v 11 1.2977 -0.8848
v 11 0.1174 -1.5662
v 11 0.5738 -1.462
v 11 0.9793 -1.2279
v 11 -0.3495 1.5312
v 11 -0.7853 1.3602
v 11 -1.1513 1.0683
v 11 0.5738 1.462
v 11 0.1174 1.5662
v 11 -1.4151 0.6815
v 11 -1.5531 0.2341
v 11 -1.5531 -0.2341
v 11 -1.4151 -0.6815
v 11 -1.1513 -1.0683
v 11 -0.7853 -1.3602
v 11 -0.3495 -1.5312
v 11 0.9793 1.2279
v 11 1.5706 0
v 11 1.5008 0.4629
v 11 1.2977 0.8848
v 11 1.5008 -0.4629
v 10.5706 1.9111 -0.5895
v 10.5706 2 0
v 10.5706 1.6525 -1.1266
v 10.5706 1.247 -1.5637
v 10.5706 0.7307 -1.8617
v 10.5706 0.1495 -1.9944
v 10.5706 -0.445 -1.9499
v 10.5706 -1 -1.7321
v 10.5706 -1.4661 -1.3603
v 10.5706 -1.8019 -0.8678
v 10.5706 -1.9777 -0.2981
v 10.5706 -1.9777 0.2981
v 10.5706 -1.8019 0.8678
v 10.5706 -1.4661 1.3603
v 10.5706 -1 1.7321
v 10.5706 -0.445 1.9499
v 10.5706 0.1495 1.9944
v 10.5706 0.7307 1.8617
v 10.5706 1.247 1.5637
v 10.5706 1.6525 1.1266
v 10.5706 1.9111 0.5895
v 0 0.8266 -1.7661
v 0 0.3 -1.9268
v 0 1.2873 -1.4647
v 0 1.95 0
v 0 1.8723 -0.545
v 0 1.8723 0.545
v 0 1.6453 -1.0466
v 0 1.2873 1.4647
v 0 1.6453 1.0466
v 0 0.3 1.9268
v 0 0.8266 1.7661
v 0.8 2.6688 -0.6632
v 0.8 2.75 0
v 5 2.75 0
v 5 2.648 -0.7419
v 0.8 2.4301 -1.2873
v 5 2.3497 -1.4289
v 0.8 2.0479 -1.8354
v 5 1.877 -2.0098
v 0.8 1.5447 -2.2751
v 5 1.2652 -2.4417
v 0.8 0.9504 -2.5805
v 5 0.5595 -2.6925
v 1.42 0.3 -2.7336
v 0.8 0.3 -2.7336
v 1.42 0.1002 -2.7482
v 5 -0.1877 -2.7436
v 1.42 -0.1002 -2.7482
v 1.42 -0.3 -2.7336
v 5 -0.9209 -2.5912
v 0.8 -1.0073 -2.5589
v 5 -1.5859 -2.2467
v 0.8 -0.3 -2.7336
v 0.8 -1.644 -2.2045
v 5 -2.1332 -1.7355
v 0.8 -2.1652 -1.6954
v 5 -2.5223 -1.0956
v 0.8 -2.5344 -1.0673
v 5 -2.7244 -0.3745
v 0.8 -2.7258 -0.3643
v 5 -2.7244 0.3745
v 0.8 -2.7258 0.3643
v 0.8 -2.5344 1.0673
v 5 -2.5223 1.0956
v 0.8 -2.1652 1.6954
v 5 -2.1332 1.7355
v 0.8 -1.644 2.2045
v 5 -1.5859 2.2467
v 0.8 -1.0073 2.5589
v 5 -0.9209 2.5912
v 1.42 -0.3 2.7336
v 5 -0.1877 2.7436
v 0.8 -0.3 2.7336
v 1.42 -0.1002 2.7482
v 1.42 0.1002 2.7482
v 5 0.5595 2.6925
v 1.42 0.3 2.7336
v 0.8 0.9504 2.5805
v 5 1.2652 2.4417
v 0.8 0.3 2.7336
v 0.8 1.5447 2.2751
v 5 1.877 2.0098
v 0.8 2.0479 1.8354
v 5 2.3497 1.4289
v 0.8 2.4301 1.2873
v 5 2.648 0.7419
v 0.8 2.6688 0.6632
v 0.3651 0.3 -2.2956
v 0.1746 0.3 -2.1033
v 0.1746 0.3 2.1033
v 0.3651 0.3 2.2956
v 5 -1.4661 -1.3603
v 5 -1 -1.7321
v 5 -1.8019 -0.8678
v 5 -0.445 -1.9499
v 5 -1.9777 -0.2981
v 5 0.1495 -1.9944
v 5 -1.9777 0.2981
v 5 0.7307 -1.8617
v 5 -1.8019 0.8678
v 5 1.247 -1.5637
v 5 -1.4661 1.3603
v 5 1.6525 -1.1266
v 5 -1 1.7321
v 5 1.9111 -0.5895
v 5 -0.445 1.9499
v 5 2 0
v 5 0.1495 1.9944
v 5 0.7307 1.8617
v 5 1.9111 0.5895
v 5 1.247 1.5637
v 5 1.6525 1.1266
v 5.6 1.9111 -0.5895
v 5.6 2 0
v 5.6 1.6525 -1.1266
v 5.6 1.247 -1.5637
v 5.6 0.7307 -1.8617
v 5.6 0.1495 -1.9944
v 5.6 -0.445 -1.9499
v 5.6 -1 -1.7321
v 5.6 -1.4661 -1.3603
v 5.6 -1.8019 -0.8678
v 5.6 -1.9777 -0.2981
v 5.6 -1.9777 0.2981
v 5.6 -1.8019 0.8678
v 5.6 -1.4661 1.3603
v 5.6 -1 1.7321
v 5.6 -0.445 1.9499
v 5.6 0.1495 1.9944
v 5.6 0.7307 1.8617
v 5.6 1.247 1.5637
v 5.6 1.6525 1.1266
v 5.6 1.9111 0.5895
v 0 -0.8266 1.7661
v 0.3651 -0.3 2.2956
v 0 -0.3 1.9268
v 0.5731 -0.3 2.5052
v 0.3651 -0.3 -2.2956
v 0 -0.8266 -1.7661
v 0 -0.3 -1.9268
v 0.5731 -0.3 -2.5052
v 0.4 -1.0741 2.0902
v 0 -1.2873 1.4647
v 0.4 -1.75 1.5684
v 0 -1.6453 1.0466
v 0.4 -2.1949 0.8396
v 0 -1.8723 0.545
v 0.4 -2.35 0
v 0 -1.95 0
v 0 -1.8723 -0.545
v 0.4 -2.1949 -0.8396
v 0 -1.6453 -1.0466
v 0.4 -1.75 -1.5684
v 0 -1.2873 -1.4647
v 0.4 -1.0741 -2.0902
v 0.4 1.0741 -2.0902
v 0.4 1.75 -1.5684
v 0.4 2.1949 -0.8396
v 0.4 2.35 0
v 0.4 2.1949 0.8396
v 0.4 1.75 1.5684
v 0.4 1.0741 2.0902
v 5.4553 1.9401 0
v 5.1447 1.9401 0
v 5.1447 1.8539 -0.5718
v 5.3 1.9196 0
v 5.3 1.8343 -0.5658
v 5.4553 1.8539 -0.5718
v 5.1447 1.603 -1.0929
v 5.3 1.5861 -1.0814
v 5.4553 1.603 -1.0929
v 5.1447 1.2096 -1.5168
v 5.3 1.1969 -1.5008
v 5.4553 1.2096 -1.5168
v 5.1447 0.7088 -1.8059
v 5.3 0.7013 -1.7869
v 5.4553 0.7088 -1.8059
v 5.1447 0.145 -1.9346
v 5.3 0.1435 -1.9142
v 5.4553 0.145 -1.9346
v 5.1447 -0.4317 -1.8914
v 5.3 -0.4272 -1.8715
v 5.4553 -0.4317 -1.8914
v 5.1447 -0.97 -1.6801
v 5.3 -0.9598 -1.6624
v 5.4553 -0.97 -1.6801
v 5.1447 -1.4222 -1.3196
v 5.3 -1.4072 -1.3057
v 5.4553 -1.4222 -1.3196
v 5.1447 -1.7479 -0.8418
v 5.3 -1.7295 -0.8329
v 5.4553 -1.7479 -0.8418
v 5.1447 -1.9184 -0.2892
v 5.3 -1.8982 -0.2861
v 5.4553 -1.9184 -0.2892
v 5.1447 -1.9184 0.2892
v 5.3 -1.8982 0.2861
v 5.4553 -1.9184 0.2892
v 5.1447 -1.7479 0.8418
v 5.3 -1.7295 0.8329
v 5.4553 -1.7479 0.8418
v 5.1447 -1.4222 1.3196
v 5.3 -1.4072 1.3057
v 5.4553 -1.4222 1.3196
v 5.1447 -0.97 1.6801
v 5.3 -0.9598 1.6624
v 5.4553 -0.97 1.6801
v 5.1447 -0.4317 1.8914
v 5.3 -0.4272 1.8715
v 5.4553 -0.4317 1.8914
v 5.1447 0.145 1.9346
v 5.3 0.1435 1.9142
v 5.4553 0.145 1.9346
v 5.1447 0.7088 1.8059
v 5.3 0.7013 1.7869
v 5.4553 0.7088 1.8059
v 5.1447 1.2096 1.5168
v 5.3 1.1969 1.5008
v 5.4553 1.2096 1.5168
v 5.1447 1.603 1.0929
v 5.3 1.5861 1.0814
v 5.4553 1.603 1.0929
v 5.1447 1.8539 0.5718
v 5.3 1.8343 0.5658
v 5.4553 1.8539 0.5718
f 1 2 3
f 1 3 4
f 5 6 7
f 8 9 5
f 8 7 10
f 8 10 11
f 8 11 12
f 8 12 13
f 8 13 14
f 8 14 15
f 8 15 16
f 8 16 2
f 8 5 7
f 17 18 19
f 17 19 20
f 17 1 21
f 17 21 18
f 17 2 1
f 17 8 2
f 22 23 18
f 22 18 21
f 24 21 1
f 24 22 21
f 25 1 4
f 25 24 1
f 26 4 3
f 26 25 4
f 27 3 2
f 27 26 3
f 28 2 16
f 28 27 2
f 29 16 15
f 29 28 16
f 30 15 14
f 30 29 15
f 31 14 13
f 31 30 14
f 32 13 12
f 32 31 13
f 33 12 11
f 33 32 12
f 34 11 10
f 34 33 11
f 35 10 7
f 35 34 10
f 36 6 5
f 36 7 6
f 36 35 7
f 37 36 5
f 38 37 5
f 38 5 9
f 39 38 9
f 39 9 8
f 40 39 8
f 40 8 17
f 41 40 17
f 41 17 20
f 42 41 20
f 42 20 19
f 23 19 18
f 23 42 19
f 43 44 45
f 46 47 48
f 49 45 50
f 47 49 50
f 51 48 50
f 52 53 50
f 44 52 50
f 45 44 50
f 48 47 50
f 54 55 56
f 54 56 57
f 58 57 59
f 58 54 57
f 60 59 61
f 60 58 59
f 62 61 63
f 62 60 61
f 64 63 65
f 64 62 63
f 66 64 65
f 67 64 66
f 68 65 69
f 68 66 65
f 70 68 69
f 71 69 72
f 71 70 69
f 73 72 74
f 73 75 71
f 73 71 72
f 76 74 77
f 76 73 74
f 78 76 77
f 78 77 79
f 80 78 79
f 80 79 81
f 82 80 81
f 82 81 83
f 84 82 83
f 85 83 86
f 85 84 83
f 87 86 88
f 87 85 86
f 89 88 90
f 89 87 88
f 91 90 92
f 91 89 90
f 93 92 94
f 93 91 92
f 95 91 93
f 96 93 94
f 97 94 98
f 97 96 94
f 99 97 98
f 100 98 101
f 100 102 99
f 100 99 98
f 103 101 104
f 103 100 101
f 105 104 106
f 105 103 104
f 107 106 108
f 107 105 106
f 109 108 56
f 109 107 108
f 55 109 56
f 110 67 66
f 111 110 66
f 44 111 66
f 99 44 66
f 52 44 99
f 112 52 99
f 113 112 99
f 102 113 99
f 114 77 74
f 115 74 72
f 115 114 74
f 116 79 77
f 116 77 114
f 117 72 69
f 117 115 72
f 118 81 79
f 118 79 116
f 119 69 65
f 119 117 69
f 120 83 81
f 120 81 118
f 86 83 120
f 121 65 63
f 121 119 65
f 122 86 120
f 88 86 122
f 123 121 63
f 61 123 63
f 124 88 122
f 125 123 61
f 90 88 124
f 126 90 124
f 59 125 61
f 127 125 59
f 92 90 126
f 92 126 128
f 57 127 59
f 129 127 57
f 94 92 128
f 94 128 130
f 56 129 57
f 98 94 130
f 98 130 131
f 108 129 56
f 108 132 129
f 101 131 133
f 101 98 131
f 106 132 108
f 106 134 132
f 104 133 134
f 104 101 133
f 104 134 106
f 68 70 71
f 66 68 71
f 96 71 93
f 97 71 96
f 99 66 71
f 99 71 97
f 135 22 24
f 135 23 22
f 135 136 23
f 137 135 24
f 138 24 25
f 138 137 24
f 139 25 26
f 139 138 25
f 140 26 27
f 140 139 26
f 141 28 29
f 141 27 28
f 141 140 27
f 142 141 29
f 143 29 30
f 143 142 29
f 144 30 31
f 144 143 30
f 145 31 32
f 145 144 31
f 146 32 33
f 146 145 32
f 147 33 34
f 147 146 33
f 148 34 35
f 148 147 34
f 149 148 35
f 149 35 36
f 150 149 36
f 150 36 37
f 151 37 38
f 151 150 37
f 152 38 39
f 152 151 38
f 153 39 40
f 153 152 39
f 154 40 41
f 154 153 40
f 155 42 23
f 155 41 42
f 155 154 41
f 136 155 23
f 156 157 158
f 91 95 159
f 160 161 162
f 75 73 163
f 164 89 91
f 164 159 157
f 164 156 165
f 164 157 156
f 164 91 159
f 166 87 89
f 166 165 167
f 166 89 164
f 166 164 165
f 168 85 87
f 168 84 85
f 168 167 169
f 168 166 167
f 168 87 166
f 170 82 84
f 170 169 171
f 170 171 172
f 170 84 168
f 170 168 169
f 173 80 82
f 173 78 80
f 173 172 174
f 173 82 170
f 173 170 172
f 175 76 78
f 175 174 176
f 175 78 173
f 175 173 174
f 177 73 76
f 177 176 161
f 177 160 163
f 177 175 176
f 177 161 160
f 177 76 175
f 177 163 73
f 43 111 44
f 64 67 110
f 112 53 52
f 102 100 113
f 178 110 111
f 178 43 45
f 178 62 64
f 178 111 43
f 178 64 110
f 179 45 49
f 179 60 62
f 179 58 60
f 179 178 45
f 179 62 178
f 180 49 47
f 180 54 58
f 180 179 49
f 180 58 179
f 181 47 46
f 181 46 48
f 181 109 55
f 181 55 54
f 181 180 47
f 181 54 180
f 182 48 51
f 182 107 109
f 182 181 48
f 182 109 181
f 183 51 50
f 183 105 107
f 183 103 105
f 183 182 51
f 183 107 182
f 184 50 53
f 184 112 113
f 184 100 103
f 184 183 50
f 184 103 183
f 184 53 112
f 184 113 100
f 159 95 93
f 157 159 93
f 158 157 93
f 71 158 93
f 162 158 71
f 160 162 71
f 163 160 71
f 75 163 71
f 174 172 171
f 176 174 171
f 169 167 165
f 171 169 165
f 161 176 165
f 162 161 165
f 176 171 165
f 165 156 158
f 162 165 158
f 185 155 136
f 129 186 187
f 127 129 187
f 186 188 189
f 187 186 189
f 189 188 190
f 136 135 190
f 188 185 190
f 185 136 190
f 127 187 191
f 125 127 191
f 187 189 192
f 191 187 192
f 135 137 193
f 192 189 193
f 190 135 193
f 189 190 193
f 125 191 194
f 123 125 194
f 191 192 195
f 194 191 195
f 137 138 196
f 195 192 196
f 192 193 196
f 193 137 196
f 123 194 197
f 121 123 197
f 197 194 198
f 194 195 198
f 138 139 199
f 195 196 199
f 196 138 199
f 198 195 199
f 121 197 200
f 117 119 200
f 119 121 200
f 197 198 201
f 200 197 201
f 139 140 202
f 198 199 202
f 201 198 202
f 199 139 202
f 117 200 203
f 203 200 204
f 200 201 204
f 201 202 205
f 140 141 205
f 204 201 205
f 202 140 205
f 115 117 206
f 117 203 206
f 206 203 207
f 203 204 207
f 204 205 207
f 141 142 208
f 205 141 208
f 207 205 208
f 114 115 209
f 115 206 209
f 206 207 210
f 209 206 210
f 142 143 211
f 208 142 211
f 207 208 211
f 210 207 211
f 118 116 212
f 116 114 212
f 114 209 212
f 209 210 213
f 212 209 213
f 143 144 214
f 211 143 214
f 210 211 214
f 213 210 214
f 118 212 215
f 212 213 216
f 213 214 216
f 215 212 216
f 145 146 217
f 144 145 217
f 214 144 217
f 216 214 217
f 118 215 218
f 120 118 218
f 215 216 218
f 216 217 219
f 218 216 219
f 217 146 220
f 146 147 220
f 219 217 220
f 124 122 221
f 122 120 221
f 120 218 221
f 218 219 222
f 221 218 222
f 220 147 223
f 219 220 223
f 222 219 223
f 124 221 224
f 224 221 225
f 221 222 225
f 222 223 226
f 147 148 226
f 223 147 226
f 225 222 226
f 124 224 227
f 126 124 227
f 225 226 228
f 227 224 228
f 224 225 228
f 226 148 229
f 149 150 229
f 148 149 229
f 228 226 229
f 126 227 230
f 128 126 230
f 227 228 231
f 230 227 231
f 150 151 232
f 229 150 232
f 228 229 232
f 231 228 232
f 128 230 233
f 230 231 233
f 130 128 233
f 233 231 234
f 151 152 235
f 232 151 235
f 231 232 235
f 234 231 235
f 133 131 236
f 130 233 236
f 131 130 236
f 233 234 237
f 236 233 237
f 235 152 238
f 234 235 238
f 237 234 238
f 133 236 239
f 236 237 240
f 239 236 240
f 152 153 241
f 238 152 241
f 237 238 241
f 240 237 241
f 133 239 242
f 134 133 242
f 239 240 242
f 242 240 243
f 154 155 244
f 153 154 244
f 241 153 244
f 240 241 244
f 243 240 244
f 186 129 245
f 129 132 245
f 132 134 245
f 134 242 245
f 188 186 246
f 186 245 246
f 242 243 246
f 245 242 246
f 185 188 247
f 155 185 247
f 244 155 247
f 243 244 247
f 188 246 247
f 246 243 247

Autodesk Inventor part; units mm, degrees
ref_plane "YZ Plane" through (0, 0, 0) normal (1, 0, 0) x (0, 1, 0)
ref_plane "XZ Plane" through (0, 0, 0) normal (0, 1, 0) x (-1, 0, 0)
sketch "Skizze1" plane through (0, 0, 0) normal (0, 0, 1) x (1, 0, 0)
  line L0 (0, 0) -> (11, 0)
  line L1 (11, 0) -> (11, 2)
  line L2 (11, 2) -> (5, 2)
  line L3 (5, 2) -> (5, 2.75)
  line L4 (5, 2.75) -> (0, 2.75)
  line L5 (0, 2.75) -> (0, 0)
  line L6 (-2.2, 0) -> (13.2, 0) projected
  line L7 (0, -0.55) -> (0, 3.3) projected
  arc A0 (5, 2) -> (5.6, 2) centre (5.3, 2.5196) ccw
  dimension "d0" = 5
  dimension "d1" = 6
  dimension "d2" = 4
  dimension "d3" = 5.5
  dimension "d14" = 0.6
  dimension "d15" = 0.6
revolve "Körper" add sketch "Skizze1" angle 360 about axis through (0, 0, 0) along (1, 0, 0)
sketch "Skizze2" plane through (0, 0, 0) normal (-1, 0, 0) x (0, 0, 1)
  circle A0 centre (0, 0) radius 2.75 projected
  line L0 (0, -3.85) -> (0, 3.85) projected
  line L1 (-3.85, 0) -> (3.85, 0) projected
  line L2 (-2.75, 0.3) -> (2.75, 0.3)
  line L3 (2.75, 0.3) -> (2.75, -0.3)
  line L4 (2.75, -0.3) -> (-2.75, -0.3)
  line L5 (-2.75, -0.3) -> (-2.75, 0.3)
  line L6 (-2.75, 0) -> (2.75, 0) construction
  line L7 (0, 0.3) -> (0, -0.3) construction
  dimension "d5" = 0.6
extrude "Loch" cut sketch "Skizze2" against normal blind 1.42 contours L1 L0 L2 A0 | L3 L4 A0 | A0 L4 L0 L1 | A0 L2 L3 | L1 A0 L2 L0 | L0 L4 A0 L1 | L5 L2 A0 | A0 L4 L5
chamfer "Fase1" distance 0.8 angle 45 3 edges at (0, 2.0479, -1.8354) (0, 2.0479, 1.8354) (0, -2.75, 0) measured on face at (2.14, 0.7465, 2.6467)
thread "Gewinde" size "M4x0.7" class "6g" standard "ISO Metric profile" length 6
chamfer "Fase2" distance 0.4294 distance2 0.4294 1 edges at (11, -2, 0) measured on face at (11, 0.6473, 0.1595)
revolve "Nut1" cut sketch "Skizze1" angle 360 about axis through (0, 0, 0) along (1, 0, 0) contours A0 L2
ref_plane "Work Plane1" through (8, 0, 0) normal (0, 0, -1) x (1, 0, 0)
equation "\"d0\" = KOH"
equation "\"d1\" = GEL"
equation "\"d2\" = NND"
equation "\"d3\" = KOD"
equation "\"d14\" = SBR"
equation "\"d15\" = SBR"
equation "\"d5\" = SBR"
equation "\"d6\" = STI"
equation "\"d8\" = PHH"
equation "\"d19\" = PHH"
equation "\"d10\" = GEL"
equation "\"d12\" = -0.5 * GD1 + 0.5 * NND"
equation "\"d13\" = GUL"
equation "\"NND\" = 4"
equation "\"GEL\" = 6"
equation "\"KOD\" = 5.5"
equation "\"KOH\" = 5"
equation "\"SBR\" = 0.6"
equation "\"GUL\" = 0.61345 * PTC"
equation "\"PHH\" = 0.8"
equation "\"GD1\" = THREADDIA - 1.2269 * PTC"
equation "\"STI\" = 1.42"
equation "\"THREADDIA\" = 4"
equation "\"TOA\" = 30deg"
equation "\"NLG\" = GEL"
equation "\"PTC\" = 0.7"
equation "\"GAL\" = 0.61345 * PTC"
properties part number "DIN 927 - M4 x 5-14H" material "Stahl, weich"
